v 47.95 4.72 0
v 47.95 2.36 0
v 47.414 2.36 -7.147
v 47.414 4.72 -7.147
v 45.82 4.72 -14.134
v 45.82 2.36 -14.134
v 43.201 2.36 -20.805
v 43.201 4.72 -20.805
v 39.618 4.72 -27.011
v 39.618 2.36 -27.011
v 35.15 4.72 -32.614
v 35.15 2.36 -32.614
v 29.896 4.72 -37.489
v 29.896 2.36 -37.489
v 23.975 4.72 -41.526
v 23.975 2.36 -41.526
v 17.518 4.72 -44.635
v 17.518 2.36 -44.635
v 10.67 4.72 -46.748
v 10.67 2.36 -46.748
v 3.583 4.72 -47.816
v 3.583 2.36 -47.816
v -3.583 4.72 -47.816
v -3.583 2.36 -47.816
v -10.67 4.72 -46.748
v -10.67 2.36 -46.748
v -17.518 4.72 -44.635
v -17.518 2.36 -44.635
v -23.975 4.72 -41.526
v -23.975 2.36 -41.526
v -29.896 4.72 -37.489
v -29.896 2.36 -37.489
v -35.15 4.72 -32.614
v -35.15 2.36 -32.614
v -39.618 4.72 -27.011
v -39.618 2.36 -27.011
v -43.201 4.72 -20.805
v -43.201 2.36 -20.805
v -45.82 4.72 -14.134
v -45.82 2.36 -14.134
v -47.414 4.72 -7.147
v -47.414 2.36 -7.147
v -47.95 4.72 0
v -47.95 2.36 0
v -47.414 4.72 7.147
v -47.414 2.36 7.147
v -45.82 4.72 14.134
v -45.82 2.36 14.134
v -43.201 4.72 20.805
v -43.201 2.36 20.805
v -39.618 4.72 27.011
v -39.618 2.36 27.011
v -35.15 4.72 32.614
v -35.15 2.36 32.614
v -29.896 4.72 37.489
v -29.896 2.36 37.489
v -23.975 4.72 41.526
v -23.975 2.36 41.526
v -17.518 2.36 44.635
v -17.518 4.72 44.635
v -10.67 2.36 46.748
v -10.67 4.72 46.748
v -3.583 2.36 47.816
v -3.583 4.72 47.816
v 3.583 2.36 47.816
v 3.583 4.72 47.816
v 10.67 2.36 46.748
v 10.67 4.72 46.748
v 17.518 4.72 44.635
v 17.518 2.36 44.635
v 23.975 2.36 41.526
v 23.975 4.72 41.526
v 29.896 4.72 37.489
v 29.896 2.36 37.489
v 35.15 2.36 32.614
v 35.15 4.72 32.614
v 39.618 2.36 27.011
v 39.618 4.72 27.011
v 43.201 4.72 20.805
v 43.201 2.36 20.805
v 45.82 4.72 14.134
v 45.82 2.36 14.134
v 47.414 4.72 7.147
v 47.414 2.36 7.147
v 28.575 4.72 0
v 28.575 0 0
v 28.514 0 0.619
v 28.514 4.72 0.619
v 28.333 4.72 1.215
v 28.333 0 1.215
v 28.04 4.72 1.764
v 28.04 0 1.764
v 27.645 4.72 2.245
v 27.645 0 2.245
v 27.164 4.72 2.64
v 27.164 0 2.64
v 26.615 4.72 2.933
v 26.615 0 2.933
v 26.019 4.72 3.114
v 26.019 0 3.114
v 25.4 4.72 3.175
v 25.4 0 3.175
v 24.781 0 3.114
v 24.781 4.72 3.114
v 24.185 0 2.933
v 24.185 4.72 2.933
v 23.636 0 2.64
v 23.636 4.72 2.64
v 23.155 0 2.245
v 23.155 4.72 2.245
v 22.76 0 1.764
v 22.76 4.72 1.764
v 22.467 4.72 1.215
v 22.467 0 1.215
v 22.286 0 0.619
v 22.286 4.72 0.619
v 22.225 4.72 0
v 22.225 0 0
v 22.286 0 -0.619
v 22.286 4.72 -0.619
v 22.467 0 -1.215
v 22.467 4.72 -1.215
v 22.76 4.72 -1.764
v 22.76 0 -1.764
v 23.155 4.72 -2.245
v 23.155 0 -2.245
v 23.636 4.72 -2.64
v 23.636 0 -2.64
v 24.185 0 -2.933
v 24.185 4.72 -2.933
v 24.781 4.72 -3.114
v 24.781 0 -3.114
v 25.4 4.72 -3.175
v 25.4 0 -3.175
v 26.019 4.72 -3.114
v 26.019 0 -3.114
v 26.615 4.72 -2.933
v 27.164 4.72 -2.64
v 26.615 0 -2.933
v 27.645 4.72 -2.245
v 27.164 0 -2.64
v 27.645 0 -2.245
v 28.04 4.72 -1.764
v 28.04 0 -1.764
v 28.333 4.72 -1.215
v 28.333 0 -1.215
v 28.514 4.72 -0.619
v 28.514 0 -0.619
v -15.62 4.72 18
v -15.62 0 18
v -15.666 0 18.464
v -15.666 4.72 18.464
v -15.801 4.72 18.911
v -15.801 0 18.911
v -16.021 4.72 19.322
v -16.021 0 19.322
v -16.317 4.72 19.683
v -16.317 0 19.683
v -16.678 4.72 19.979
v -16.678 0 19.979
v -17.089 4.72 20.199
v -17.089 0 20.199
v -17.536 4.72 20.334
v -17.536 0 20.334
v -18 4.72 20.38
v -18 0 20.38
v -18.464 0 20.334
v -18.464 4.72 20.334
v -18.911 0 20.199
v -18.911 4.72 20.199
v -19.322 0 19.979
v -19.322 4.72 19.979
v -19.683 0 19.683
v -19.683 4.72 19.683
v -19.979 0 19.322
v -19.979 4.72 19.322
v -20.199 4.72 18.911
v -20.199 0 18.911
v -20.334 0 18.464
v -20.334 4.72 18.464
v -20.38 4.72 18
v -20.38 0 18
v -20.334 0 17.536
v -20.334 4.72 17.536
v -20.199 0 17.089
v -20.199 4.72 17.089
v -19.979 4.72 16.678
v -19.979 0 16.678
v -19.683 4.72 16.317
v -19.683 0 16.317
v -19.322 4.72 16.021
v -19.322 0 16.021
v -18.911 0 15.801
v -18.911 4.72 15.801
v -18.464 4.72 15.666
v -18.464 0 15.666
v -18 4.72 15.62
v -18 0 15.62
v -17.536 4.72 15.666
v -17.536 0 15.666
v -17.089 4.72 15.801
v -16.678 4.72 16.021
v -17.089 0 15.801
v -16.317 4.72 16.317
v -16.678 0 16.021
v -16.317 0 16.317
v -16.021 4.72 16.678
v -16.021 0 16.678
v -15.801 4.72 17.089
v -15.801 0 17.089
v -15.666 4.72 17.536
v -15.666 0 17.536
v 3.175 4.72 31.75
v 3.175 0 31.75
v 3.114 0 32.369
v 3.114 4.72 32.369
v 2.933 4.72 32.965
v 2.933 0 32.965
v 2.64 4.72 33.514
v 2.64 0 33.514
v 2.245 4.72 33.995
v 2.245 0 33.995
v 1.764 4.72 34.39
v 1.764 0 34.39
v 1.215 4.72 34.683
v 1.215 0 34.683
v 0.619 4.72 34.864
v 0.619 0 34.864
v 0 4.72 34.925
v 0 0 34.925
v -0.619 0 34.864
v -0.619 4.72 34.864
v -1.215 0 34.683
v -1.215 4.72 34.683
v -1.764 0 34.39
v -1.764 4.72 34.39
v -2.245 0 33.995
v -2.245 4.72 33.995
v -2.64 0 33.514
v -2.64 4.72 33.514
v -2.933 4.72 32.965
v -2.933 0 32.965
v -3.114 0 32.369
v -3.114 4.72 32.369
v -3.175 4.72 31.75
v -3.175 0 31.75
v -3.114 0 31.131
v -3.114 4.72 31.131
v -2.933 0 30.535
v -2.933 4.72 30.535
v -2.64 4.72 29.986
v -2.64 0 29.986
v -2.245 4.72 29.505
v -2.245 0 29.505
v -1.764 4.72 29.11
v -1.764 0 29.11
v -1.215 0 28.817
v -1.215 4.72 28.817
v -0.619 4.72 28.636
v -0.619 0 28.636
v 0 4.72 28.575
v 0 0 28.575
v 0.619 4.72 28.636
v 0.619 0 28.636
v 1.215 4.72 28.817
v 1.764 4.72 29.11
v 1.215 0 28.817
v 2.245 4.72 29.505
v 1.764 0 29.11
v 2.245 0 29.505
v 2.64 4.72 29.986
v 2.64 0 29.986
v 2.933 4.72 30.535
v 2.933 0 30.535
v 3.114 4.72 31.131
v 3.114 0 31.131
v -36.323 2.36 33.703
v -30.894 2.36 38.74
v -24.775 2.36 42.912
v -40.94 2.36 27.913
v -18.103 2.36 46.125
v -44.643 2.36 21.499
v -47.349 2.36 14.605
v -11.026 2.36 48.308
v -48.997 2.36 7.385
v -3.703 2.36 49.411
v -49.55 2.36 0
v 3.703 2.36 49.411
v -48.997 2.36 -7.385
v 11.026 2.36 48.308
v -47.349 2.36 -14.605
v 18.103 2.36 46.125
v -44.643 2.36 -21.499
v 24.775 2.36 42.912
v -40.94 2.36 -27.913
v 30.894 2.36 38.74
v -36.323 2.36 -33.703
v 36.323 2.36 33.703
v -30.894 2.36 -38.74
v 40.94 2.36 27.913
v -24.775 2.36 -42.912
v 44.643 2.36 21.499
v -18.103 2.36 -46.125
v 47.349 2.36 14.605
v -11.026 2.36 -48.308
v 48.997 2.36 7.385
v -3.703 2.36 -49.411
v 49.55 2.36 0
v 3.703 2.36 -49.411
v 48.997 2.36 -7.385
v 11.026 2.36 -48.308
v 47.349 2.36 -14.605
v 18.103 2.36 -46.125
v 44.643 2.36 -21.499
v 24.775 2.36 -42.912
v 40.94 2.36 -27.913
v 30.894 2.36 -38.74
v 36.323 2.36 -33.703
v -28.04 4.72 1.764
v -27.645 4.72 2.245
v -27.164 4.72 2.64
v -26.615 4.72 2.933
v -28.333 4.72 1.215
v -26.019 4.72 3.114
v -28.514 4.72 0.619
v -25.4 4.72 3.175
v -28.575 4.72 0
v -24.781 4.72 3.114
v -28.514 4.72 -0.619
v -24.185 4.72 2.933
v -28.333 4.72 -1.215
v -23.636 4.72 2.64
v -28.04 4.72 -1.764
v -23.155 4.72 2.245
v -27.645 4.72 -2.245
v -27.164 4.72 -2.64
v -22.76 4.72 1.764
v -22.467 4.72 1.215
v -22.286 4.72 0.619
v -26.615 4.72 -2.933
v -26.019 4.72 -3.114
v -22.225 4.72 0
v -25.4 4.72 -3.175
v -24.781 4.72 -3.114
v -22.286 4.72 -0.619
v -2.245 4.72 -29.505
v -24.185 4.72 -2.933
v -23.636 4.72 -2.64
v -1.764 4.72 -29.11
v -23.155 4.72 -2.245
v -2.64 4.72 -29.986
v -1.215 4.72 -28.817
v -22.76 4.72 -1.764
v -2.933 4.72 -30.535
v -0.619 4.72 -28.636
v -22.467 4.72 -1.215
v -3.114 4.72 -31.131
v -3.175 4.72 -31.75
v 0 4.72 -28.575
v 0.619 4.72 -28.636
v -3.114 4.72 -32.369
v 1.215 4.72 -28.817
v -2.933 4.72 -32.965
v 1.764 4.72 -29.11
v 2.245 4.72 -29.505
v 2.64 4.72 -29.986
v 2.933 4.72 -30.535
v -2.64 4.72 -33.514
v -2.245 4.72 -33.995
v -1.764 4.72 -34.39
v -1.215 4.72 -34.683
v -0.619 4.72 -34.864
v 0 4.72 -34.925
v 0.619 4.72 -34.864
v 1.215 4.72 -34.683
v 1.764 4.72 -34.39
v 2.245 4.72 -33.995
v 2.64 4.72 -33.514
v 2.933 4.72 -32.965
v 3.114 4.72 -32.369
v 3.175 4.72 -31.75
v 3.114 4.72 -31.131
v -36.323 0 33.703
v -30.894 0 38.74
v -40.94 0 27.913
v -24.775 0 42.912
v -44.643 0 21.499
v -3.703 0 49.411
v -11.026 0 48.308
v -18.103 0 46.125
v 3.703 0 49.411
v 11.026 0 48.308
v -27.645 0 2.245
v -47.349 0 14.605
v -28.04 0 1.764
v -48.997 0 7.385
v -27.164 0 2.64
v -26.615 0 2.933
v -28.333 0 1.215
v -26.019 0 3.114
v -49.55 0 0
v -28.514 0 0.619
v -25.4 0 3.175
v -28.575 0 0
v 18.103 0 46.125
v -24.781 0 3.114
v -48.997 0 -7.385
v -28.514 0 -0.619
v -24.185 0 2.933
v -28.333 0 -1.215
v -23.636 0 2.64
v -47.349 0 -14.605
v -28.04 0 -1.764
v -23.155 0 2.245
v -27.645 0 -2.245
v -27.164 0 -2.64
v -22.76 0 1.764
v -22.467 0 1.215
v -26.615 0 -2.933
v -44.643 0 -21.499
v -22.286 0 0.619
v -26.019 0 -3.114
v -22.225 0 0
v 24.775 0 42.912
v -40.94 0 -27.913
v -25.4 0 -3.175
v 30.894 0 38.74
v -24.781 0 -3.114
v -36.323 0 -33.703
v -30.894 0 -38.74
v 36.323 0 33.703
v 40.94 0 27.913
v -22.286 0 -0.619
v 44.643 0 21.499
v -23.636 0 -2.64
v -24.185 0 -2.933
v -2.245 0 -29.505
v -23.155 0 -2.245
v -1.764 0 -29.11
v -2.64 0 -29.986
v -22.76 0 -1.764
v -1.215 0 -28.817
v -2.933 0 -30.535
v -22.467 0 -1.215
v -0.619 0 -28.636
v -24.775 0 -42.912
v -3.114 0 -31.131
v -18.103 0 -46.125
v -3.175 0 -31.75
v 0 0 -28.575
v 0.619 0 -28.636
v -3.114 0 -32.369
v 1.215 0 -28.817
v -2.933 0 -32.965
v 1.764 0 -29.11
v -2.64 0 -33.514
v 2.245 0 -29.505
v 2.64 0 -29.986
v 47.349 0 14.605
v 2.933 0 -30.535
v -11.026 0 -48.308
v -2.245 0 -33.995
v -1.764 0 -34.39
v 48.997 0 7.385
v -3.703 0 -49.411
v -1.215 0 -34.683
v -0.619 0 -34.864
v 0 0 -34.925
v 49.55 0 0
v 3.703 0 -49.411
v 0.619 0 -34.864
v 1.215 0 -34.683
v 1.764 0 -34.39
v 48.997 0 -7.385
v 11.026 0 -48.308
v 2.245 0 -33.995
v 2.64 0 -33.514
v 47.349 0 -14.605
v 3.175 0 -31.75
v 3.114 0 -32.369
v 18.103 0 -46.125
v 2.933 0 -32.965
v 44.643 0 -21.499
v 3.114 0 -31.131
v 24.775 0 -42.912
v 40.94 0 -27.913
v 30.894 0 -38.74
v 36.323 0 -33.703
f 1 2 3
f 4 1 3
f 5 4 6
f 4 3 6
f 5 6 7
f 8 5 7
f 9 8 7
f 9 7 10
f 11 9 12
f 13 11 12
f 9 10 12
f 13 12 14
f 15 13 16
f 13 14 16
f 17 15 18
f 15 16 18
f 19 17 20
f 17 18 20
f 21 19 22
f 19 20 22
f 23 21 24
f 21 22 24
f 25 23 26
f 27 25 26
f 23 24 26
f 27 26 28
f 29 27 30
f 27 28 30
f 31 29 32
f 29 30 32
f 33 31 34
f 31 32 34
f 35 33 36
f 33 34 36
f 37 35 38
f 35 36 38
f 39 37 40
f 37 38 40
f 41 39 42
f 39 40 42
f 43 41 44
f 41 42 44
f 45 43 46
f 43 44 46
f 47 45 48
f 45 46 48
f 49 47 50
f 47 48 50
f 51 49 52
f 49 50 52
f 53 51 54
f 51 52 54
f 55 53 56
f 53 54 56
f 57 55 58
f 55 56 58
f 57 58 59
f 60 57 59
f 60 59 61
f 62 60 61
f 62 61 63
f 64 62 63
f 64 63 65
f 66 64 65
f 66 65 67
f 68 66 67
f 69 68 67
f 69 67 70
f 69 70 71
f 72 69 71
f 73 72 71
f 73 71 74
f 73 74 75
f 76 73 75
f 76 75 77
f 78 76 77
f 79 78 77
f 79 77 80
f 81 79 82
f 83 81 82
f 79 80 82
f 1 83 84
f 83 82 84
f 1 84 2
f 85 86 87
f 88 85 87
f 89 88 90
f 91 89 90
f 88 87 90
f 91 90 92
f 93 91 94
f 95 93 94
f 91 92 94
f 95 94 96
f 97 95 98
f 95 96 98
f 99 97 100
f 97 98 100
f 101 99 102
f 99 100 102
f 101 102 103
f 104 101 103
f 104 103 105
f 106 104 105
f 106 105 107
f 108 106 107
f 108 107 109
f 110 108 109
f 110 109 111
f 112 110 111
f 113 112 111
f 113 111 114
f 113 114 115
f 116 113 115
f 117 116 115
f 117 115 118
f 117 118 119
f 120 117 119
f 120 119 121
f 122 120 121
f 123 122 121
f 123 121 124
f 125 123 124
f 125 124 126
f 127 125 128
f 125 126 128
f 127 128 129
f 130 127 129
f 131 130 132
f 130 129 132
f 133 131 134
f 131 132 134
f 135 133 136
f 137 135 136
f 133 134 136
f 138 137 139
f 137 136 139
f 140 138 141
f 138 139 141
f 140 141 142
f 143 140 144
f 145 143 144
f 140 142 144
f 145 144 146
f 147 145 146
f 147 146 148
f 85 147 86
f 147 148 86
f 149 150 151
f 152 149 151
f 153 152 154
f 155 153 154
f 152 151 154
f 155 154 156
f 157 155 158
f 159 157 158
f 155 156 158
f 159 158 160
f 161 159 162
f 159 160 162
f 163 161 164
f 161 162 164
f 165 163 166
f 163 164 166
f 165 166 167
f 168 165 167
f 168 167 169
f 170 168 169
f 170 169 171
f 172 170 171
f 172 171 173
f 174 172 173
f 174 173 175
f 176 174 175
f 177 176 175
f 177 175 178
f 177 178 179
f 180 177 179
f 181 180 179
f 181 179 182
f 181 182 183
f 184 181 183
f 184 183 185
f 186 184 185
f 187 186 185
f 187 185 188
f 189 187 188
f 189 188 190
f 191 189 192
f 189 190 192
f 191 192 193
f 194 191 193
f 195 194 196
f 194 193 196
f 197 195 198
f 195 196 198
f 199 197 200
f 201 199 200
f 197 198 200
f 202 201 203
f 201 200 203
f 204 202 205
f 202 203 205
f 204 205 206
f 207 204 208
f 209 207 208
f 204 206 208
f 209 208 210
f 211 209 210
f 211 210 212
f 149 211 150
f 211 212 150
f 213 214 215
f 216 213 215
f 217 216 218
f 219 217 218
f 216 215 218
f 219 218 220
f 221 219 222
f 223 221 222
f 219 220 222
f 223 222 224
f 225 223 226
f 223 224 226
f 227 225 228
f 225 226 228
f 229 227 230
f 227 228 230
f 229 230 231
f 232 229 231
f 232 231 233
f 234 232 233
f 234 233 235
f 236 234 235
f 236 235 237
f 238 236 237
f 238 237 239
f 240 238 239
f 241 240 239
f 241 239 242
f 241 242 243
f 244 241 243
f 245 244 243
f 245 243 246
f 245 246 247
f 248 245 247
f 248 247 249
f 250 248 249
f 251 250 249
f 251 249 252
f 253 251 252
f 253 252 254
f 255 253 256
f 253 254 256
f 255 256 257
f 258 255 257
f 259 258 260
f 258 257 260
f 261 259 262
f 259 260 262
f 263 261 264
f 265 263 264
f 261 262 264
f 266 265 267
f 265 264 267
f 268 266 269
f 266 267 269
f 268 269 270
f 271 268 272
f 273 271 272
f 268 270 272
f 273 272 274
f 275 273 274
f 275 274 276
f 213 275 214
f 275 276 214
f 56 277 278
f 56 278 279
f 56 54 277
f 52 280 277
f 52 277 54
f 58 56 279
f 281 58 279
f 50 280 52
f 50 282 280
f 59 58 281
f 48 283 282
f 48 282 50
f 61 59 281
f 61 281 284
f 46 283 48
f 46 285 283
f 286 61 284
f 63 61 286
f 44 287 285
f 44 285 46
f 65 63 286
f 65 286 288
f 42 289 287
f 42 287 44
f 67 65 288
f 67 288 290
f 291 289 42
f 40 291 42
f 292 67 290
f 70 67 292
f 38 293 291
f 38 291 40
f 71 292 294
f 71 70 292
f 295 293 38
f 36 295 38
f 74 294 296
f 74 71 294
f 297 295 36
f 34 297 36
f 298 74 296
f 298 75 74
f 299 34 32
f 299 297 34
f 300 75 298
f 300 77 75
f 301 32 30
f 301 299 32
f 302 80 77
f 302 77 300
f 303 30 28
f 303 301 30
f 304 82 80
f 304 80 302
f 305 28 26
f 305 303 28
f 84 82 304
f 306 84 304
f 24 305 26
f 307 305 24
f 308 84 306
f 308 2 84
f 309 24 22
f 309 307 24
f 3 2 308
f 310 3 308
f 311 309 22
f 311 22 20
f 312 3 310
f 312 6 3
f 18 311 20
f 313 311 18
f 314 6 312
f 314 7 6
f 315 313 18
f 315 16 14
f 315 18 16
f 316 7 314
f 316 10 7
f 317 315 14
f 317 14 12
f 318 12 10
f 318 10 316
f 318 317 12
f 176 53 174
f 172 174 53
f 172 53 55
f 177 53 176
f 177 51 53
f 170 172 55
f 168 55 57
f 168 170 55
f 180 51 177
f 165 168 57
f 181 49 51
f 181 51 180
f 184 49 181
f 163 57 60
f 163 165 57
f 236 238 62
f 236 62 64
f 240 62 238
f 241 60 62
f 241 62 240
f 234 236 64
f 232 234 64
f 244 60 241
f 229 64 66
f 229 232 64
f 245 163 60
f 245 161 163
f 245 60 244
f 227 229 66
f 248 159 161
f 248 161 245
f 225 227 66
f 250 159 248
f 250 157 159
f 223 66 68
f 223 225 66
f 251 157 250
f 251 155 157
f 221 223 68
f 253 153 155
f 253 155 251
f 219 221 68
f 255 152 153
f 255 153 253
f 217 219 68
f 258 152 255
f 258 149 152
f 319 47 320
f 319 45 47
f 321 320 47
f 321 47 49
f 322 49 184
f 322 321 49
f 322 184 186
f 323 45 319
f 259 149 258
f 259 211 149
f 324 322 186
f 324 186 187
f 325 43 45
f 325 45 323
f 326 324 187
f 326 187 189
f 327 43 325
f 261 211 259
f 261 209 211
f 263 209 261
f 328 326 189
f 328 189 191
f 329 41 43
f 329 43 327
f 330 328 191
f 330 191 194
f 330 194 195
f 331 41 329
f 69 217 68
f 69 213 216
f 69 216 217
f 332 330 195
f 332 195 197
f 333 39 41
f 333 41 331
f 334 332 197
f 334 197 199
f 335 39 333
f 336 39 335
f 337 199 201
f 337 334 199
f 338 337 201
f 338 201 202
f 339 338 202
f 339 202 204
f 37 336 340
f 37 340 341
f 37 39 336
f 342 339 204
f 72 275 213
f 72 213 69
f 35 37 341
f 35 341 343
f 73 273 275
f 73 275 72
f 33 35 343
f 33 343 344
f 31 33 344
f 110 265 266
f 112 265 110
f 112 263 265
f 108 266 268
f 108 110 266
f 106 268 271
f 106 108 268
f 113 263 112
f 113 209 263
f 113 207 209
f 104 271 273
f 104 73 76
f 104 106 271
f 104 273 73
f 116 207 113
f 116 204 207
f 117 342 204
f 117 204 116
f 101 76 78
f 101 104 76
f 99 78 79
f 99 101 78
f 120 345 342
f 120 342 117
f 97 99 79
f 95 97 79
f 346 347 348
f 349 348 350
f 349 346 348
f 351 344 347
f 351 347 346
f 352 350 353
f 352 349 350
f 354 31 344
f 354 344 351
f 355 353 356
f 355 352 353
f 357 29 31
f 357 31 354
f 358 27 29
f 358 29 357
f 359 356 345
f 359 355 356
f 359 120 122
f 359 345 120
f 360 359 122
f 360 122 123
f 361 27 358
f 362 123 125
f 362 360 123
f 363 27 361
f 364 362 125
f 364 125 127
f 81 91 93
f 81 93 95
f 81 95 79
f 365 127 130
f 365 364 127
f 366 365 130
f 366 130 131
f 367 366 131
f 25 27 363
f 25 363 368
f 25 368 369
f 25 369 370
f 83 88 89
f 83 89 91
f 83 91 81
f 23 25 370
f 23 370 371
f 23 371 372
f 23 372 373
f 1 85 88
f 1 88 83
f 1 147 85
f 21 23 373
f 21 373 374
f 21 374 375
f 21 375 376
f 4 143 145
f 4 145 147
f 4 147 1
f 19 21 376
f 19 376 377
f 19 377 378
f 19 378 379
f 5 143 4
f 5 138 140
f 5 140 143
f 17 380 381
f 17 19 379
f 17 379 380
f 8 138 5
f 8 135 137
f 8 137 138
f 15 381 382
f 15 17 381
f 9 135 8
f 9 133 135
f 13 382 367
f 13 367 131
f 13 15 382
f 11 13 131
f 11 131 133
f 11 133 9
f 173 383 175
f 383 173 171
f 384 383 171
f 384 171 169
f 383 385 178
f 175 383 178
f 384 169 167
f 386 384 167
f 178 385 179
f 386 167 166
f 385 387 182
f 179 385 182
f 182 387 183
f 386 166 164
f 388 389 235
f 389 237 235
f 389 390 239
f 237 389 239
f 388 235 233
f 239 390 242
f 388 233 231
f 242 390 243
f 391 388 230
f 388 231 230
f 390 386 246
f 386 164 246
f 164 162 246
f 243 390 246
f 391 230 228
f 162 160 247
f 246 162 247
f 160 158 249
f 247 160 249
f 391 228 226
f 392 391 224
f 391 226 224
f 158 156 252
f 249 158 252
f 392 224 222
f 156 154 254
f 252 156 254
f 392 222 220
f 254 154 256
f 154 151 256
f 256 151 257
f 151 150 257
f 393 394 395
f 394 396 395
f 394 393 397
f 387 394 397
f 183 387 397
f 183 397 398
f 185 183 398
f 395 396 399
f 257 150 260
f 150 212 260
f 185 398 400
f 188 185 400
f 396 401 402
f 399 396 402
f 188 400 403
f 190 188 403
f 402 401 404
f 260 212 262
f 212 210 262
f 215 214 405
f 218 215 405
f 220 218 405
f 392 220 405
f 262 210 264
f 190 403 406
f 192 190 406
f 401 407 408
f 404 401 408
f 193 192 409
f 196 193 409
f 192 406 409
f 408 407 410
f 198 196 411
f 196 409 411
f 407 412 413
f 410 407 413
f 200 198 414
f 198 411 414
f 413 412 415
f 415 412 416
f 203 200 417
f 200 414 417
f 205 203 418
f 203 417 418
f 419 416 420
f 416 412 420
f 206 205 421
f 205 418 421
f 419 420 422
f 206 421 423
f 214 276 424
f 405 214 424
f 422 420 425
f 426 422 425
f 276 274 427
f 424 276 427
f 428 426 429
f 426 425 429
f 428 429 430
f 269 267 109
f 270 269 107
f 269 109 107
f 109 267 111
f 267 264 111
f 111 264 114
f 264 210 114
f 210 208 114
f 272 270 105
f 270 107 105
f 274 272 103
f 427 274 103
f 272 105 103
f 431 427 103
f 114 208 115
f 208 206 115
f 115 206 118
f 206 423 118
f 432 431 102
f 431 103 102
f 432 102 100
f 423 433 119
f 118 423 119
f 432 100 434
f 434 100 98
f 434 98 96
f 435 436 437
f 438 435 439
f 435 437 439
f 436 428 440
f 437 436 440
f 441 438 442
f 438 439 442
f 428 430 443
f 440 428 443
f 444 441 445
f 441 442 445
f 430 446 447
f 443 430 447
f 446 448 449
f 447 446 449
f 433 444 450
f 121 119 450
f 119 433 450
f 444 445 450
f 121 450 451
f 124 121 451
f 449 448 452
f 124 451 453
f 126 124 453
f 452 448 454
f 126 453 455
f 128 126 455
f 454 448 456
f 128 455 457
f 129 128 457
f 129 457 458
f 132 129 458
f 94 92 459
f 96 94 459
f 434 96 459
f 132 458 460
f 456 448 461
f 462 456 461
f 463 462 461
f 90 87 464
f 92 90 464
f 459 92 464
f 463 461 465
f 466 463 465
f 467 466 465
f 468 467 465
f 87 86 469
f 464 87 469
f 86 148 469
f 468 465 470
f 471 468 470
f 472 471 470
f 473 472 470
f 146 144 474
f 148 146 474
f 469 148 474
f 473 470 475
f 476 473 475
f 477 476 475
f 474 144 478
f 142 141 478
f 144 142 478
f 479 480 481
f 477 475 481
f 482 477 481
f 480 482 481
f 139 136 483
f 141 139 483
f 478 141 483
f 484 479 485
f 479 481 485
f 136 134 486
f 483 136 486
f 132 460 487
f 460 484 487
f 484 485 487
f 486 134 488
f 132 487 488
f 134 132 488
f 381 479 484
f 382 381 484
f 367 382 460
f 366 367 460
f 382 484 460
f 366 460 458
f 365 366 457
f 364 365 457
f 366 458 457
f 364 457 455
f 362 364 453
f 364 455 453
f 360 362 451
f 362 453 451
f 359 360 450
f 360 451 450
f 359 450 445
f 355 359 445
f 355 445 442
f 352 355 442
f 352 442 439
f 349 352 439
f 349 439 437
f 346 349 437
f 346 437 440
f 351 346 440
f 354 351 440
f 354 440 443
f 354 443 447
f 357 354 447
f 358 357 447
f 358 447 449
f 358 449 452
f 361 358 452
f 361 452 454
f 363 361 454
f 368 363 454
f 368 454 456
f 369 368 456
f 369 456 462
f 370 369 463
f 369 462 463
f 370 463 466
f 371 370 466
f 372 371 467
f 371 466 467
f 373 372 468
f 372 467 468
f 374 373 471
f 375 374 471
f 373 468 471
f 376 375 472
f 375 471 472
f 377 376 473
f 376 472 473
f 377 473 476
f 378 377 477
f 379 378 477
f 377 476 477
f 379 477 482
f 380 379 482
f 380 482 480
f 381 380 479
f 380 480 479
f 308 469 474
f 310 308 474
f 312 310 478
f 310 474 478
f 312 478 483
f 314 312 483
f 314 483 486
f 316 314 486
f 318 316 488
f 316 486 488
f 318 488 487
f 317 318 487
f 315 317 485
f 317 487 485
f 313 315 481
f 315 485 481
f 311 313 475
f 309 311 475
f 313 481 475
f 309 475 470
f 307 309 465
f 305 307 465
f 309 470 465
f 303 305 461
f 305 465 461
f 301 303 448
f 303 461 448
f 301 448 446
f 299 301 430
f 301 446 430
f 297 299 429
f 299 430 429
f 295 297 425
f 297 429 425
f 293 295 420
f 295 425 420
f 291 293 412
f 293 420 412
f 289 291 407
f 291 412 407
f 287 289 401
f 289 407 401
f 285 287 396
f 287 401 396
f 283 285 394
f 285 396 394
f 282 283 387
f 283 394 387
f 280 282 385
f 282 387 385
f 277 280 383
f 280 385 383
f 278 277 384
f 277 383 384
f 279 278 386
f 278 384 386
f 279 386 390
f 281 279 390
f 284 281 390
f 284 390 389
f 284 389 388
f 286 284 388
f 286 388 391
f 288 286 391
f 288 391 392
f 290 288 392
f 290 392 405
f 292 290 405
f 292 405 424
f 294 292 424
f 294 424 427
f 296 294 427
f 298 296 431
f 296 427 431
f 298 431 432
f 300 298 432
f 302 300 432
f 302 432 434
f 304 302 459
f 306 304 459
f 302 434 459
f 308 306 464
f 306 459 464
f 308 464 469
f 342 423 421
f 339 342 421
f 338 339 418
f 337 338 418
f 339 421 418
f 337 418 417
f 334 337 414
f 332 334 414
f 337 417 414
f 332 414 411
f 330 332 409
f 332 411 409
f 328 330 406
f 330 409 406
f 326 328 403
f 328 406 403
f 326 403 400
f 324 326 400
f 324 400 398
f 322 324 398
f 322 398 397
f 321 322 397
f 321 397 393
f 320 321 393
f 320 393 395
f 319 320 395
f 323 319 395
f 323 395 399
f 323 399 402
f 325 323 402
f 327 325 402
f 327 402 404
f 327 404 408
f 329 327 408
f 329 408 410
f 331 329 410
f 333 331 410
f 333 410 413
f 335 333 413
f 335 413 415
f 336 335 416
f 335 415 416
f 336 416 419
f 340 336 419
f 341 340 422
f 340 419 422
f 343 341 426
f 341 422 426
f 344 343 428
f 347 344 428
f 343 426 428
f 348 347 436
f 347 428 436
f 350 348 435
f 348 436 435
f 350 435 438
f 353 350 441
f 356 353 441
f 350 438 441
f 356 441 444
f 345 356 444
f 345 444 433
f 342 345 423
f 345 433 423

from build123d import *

# Parameters (mm, degrees)
SKETCH1_R           = 49.55
BOSS_EXTRUDE1_DEPTH = 2.36
SKETCH2_R           = 47.95
BOSS_EXTRUDE2_DEPTH = 2.36
SKETCH3_R           = 3.175
SKETCH3_R_2         = 2.38
CUT_EXTRUDE1_DEPTH  = 5.72


with BuildPart() as part:
    # Sketch1 → Boss-Extrude1 (new body)
    with BuildSketch(Plane(origin=(0, 0, 0), x_dir=(1, 0, 0), z_dir=(0, 1, 0))):
        Circle(SKETCH1_R)
    extrude(amount=BOSS_EXTRUDE1_DEPTH)

    # Sketch2 → Boss-Extrude2 (add)
    with BuildSketch(Plane(origin=(0, 2.36, 0), x_dir=(1, 0, 0), z_dir=(0, 1, 0))):
        Circle(SKETCH2_R)
    extrude(amount=BOSS_EXTRUDE2_DEPTH)

    # Sketch3 → Cut-Extrude1 (cut, through all)
    with BuildSketch(Plane.XZ):
        with Locations((25.4, 0)):
            Circle(SKETCH3_R)
        with Locations((-25.4, 0)):
            Circle(SKETCH3_R)
        with Locations((0, 31.75)):
            Circle(SKETCH3_R)
        with Locations((0, -31.75)):
            Circle(SKETCH3_R)
        with Locations((-18, 18)):
            Circle(SKETCH3_R_2)
    extrude(amount=-CUT_EXTRUDE1_DEPTH, mode=Mode.SUBTRACT)


solid = part.part
